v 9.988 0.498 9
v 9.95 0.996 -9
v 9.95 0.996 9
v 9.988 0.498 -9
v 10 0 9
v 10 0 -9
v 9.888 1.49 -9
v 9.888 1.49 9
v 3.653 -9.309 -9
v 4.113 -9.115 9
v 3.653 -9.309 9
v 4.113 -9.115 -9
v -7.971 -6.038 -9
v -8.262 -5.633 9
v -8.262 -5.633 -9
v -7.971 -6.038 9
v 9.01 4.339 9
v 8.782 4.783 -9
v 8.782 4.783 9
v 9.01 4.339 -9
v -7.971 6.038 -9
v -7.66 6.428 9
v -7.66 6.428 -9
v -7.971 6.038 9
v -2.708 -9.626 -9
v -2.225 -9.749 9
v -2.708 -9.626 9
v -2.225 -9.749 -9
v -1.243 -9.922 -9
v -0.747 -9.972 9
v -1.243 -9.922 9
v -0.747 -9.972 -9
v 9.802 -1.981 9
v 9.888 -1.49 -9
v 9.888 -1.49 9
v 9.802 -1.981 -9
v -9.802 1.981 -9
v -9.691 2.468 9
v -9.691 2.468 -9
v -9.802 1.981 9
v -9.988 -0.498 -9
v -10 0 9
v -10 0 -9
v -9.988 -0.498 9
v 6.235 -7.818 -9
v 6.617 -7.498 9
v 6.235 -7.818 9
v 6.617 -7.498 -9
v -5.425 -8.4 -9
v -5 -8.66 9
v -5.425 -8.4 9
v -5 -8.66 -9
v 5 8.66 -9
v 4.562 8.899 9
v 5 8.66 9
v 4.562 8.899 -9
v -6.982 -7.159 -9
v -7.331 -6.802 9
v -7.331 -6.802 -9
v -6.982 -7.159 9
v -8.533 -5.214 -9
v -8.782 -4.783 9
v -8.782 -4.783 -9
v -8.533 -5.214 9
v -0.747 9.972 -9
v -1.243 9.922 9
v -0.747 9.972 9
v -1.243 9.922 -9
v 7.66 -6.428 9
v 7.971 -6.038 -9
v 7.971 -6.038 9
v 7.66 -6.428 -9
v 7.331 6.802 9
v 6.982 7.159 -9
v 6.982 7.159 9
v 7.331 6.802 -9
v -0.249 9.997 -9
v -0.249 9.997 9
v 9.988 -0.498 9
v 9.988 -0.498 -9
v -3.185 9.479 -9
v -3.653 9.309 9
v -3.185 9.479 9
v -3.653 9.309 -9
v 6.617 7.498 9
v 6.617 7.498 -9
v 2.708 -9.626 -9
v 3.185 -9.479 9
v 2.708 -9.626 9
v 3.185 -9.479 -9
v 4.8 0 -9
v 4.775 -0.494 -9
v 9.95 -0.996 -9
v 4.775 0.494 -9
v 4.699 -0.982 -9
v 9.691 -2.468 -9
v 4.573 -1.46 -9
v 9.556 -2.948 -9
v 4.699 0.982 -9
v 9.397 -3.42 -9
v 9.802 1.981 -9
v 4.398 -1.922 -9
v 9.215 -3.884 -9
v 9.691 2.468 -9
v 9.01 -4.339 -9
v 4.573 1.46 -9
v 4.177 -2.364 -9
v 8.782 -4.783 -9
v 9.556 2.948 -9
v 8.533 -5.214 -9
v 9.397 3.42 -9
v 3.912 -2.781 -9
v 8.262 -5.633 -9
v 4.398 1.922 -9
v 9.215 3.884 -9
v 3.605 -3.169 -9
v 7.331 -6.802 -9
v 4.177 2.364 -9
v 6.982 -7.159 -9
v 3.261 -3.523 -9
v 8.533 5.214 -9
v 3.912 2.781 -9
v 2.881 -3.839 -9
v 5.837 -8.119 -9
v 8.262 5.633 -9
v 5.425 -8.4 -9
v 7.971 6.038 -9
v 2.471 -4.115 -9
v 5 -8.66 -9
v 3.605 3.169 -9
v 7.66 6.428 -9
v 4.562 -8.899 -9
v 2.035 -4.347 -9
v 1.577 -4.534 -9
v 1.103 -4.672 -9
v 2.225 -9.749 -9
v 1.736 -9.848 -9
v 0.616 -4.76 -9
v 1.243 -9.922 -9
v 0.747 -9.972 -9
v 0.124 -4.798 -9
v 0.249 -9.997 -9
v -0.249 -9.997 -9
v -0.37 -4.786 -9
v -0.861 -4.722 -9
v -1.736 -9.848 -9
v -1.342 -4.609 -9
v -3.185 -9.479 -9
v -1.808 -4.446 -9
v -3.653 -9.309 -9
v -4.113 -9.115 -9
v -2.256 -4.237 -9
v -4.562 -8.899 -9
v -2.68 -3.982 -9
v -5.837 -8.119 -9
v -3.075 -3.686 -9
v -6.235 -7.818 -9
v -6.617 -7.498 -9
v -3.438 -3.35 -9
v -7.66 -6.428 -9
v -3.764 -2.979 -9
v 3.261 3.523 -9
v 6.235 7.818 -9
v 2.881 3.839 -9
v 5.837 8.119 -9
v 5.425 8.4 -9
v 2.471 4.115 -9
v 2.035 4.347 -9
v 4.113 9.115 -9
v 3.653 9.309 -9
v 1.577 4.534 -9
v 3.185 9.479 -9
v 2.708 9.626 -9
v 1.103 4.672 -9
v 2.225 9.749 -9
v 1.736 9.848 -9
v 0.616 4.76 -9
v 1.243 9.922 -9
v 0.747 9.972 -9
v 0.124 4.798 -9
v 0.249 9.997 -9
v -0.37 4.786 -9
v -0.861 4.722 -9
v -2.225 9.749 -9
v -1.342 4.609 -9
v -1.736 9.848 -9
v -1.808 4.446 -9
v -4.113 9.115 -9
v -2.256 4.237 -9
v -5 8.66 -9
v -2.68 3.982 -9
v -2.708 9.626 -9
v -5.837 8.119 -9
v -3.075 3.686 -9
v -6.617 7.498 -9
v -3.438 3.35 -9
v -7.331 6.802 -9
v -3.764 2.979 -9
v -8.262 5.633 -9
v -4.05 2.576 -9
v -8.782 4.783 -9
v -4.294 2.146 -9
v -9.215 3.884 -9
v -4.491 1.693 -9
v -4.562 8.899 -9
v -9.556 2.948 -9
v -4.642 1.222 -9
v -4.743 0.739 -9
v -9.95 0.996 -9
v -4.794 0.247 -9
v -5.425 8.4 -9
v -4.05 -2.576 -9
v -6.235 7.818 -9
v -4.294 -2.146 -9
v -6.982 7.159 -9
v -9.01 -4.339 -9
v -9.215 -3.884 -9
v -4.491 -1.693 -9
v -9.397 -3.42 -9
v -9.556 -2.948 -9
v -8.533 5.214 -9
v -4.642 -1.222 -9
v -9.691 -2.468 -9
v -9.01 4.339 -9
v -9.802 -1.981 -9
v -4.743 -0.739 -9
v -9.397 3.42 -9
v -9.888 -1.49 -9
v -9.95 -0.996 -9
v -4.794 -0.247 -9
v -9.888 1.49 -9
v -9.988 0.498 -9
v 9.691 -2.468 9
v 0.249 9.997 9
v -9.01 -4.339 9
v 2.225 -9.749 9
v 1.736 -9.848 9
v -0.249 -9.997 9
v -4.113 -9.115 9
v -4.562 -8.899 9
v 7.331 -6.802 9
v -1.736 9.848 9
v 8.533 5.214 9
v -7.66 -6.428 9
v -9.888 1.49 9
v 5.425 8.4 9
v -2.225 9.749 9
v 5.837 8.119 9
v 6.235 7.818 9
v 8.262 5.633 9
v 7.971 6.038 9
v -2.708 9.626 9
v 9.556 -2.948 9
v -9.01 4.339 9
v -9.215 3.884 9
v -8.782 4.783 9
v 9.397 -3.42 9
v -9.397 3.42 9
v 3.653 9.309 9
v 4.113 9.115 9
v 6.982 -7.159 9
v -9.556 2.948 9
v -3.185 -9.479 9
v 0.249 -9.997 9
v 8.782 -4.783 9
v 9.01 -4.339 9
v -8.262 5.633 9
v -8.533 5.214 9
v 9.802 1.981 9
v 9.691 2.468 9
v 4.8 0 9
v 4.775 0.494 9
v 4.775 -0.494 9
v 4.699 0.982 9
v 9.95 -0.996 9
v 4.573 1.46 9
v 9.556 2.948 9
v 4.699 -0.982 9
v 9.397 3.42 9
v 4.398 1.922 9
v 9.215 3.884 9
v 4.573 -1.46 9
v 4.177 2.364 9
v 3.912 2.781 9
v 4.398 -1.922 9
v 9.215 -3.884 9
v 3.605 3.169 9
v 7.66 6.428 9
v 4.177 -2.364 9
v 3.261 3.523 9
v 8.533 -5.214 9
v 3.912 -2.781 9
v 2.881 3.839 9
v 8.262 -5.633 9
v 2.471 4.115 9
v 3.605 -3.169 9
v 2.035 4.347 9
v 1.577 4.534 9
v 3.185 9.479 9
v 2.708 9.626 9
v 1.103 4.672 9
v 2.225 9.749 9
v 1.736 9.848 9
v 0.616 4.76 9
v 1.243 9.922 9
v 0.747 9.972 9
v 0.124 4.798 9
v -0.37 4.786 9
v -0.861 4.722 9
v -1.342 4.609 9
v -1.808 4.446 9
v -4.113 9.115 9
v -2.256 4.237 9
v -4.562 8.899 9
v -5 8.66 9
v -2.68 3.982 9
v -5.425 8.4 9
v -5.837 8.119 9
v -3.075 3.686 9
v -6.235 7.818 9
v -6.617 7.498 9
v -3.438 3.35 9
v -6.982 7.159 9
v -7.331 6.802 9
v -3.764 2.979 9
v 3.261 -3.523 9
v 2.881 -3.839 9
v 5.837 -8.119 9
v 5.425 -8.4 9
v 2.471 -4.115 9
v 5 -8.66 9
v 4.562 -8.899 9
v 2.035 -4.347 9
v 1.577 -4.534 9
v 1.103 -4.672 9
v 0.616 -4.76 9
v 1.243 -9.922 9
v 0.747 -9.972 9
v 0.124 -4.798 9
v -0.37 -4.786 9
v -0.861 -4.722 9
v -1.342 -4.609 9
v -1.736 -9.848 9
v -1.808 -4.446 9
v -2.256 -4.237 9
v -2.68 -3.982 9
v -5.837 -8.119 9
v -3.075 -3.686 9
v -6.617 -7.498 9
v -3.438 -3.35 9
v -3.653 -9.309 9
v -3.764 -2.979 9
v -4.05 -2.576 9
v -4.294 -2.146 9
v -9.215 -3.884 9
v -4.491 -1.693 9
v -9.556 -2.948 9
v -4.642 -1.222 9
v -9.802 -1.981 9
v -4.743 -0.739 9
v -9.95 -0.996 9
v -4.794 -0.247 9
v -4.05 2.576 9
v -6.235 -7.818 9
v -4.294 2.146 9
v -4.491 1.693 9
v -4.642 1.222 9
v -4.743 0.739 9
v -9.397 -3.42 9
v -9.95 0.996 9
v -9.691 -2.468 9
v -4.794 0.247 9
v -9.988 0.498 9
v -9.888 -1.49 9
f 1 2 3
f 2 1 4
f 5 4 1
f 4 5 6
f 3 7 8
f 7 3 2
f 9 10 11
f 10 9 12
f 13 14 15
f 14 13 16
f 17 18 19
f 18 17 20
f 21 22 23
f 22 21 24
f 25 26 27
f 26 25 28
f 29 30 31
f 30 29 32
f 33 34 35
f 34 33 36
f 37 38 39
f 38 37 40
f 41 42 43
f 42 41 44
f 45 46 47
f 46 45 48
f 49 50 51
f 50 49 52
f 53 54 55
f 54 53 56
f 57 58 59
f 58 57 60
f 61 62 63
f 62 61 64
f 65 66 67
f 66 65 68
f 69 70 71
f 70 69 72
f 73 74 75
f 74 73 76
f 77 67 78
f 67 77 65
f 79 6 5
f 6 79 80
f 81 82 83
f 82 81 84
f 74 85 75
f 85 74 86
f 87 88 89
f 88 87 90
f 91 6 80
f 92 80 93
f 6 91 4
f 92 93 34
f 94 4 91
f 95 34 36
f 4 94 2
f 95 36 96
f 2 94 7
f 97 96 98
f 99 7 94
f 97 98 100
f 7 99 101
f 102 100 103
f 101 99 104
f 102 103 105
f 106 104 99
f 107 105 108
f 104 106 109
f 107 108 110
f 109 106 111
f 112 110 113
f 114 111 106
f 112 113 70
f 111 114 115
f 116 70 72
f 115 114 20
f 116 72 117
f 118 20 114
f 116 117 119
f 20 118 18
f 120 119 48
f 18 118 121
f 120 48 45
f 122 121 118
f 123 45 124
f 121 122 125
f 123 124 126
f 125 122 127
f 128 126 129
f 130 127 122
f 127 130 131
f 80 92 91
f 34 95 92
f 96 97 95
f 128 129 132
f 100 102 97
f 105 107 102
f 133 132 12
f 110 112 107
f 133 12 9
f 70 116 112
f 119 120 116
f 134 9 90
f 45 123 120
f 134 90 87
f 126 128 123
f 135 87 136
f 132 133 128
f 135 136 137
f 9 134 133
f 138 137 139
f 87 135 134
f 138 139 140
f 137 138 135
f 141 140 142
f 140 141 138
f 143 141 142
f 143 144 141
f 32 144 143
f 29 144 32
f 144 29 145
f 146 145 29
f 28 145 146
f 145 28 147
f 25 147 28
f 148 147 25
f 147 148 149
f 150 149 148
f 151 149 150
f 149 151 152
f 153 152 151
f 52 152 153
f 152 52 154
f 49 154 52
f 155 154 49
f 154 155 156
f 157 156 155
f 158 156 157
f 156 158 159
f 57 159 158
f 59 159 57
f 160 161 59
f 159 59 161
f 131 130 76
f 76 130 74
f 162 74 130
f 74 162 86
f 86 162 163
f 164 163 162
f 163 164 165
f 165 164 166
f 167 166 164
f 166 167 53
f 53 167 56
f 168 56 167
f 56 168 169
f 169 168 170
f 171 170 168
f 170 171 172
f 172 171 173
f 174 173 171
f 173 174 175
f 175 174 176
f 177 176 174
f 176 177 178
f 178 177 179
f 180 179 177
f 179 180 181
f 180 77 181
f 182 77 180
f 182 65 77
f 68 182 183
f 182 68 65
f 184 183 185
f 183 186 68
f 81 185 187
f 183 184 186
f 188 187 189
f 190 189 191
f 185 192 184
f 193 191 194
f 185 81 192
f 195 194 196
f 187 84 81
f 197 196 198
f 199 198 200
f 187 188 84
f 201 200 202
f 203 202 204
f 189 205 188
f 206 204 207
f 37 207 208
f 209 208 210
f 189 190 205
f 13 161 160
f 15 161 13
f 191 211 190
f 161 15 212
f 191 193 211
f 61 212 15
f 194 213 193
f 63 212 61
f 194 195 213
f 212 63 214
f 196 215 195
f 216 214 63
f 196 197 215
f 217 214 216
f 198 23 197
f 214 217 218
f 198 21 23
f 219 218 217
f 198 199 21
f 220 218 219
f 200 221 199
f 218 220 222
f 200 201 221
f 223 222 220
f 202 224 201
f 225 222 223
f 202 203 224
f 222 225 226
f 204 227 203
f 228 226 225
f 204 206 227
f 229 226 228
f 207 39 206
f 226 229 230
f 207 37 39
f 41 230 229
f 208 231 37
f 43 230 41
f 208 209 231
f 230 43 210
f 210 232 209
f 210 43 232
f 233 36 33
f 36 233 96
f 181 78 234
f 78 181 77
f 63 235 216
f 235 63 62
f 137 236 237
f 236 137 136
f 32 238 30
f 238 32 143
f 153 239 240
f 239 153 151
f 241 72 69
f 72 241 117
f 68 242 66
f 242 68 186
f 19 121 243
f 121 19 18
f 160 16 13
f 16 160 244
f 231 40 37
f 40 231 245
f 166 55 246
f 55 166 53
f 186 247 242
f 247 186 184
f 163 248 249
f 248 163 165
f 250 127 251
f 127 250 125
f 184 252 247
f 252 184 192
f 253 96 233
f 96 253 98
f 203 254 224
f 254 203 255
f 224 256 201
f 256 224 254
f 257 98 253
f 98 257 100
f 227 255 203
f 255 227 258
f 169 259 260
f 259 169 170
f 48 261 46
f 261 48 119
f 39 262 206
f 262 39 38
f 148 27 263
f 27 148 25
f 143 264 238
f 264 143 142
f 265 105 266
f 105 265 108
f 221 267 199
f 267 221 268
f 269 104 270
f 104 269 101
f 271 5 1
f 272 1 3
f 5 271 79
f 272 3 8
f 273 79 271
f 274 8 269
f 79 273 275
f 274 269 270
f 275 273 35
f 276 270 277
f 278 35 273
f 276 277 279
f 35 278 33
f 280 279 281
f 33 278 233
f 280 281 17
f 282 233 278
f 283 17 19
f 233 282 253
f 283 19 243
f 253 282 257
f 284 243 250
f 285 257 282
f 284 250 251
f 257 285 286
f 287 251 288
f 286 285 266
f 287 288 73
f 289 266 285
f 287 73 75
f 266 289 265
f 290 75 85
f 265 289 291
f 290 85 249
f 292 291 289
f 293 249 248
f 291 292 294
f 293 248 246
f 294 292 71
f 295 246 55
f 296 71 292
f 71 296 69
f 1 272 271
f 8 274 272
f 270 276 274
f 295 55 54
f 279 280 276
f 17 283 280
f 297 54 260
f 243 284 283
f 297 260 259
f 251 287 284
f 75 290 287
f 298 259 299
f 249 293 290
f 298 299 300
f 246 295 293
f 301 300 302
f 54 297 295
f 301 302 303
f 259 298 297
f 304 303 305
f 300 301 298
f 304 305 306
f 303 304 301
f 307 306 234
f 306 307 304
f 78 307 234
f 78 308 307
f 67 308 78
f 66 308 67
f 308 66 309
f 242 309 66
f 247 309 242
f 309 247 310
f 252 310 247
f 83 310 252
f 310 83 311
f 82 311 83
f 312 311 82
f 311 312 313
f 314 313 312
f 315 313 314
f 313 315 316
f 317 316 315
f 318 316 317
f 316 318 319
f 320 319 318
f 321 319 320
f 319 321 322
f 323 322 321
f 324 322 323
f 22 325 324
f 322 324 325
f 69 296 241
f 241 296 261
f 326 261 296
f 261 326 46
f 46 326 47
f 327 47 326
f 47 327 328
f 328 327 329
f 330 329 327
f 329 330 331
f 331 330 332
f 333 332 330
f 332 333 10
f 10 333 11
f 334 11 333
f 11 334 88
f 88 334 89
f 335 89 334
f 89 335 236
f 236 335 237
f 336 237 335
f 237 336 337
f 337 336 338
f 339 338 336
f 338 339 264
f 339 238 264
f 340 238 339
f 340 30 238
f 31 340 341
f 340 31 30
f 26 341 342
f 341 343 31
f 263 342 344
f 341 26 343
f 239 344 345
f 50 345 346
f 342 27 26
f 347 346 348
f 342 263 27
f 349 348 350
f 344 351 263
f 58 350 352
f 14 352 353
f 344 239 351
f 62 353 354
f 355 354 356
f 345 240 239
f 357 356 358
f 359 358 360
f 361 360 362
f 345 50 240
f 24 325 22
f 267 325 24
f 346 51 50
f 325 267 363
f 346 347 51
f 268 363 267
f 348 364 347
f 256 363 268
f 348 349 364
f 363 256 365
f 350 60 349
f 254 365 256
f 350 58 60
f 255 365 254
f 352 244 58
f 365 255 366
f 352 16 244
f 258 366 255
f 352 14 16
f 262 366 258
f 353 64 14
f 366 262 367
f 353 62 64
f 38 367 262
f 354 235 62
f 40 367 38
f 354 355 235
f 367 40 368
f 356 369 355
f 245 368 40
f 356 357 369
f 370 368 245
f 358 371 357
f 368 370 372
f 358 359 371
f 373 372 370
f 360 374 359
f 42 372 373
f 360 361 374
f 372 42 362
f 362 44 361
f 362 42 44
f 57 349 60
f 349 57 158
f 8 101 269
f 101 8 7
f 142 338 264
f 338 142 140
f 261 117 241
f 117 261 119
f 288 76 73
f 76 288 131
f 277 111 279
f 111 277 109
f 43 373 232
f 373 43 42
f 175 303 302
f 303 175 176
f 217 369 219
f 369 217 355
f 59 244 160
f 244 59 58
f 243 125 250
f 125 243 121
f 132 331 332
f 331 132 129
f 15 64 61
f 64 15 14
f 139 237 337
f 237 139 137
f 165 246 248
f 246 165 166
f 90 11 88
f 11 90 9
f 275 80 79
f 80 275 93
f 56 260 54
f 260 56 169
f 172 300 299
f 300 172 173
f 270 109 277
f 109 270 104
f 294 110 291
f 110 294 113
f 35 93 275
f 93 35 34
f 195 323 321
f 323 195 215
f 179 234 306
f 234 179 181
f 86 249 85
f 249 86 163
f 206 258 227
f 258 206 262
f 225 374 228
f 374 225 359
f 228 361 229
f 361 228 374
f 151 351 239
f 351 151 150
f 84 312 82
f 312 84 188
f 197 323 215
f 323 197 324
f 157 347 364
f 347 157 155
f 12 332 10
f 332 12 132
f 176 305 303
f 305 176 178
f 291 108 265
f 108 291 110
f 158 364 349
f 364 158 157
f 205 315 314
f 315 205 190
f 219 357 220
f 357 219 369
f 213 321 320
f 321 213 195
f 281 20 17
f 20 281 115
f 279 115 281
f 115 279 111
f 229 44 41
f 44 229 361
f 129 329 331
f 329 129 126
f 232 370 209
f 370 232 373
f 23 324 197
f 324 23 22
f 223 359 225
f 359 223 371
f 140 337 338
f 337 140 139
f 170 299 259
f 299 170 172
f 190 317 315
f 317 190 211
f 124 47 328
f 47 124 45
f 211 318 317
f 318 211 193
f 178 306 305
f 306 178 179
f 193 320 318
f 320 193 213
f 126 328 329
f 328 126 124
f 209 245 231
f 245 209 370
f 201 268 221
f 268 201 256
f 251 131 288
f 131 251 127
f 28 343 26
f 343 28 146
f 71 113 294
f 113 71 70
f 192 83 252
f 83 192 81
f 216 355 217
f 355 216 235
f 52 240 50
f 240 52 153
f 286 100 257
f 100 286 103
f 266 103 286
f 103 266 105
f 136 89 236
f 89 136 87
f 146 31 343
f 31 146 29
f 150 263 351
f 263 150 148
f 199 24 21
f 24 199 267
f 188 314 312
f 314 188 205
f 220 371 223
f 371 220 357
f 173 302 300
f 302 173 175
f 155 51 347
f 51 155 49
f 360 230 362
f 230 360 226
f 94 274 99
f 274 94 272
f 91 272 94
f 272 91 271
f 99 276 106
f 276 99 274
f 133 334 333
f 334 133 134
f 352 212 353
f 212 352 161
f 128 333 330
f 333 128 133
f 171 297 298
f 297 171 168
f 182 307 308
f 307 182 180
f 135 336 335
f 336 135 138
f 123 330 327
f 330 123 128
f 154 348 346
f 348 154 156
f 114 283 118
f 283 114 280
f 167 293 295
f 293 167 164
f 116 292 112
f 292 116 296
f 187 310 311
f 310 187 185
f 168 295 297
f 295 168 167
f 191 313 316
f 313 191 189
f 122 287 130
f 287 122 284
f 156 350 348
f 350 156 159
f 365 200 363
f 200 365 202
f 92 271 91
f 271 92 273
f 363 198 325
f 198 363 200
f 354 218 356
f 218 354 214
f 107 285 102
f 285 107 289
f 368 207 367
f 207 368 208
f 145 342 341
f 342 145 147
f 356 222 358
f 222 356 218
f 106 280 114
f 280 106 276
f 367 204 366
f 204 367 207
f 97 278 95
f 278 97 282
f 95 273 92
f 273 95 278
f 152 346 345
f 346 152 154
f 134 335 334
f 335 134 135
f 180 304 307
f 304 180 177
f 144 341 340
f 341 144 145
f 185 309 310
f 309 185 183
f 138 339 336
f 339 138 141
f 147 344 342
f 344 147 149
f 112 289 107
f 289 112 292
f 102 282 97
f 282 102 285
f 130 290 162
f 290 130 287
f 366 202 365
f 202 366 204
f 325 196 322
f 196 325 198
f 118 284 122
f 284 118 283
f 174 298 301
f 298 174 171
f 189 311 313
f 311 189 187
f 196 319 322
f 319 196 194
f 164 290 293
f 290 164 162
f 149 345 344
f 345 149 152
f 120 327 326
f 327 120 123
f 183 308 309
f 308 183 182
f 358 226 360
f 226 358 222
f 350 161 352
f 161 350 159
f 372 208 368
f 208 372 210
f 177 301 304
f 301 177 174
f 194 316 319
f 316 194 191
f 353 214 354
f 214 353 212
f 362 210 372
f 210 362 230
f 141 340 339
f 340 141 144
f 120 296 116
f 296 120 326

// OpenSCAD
//Adaptador 20mm para 9,60mm por 20mm de altura
$fa=1; 
$fs=0.5;

module adaptador(){
    difference (){
        cylinder ( r = 10 , h = 18 , center = true);
        #cylinder ( r = 9.6 / 2 , h = 22 , center = true) ;
    }
}

adaptador();
